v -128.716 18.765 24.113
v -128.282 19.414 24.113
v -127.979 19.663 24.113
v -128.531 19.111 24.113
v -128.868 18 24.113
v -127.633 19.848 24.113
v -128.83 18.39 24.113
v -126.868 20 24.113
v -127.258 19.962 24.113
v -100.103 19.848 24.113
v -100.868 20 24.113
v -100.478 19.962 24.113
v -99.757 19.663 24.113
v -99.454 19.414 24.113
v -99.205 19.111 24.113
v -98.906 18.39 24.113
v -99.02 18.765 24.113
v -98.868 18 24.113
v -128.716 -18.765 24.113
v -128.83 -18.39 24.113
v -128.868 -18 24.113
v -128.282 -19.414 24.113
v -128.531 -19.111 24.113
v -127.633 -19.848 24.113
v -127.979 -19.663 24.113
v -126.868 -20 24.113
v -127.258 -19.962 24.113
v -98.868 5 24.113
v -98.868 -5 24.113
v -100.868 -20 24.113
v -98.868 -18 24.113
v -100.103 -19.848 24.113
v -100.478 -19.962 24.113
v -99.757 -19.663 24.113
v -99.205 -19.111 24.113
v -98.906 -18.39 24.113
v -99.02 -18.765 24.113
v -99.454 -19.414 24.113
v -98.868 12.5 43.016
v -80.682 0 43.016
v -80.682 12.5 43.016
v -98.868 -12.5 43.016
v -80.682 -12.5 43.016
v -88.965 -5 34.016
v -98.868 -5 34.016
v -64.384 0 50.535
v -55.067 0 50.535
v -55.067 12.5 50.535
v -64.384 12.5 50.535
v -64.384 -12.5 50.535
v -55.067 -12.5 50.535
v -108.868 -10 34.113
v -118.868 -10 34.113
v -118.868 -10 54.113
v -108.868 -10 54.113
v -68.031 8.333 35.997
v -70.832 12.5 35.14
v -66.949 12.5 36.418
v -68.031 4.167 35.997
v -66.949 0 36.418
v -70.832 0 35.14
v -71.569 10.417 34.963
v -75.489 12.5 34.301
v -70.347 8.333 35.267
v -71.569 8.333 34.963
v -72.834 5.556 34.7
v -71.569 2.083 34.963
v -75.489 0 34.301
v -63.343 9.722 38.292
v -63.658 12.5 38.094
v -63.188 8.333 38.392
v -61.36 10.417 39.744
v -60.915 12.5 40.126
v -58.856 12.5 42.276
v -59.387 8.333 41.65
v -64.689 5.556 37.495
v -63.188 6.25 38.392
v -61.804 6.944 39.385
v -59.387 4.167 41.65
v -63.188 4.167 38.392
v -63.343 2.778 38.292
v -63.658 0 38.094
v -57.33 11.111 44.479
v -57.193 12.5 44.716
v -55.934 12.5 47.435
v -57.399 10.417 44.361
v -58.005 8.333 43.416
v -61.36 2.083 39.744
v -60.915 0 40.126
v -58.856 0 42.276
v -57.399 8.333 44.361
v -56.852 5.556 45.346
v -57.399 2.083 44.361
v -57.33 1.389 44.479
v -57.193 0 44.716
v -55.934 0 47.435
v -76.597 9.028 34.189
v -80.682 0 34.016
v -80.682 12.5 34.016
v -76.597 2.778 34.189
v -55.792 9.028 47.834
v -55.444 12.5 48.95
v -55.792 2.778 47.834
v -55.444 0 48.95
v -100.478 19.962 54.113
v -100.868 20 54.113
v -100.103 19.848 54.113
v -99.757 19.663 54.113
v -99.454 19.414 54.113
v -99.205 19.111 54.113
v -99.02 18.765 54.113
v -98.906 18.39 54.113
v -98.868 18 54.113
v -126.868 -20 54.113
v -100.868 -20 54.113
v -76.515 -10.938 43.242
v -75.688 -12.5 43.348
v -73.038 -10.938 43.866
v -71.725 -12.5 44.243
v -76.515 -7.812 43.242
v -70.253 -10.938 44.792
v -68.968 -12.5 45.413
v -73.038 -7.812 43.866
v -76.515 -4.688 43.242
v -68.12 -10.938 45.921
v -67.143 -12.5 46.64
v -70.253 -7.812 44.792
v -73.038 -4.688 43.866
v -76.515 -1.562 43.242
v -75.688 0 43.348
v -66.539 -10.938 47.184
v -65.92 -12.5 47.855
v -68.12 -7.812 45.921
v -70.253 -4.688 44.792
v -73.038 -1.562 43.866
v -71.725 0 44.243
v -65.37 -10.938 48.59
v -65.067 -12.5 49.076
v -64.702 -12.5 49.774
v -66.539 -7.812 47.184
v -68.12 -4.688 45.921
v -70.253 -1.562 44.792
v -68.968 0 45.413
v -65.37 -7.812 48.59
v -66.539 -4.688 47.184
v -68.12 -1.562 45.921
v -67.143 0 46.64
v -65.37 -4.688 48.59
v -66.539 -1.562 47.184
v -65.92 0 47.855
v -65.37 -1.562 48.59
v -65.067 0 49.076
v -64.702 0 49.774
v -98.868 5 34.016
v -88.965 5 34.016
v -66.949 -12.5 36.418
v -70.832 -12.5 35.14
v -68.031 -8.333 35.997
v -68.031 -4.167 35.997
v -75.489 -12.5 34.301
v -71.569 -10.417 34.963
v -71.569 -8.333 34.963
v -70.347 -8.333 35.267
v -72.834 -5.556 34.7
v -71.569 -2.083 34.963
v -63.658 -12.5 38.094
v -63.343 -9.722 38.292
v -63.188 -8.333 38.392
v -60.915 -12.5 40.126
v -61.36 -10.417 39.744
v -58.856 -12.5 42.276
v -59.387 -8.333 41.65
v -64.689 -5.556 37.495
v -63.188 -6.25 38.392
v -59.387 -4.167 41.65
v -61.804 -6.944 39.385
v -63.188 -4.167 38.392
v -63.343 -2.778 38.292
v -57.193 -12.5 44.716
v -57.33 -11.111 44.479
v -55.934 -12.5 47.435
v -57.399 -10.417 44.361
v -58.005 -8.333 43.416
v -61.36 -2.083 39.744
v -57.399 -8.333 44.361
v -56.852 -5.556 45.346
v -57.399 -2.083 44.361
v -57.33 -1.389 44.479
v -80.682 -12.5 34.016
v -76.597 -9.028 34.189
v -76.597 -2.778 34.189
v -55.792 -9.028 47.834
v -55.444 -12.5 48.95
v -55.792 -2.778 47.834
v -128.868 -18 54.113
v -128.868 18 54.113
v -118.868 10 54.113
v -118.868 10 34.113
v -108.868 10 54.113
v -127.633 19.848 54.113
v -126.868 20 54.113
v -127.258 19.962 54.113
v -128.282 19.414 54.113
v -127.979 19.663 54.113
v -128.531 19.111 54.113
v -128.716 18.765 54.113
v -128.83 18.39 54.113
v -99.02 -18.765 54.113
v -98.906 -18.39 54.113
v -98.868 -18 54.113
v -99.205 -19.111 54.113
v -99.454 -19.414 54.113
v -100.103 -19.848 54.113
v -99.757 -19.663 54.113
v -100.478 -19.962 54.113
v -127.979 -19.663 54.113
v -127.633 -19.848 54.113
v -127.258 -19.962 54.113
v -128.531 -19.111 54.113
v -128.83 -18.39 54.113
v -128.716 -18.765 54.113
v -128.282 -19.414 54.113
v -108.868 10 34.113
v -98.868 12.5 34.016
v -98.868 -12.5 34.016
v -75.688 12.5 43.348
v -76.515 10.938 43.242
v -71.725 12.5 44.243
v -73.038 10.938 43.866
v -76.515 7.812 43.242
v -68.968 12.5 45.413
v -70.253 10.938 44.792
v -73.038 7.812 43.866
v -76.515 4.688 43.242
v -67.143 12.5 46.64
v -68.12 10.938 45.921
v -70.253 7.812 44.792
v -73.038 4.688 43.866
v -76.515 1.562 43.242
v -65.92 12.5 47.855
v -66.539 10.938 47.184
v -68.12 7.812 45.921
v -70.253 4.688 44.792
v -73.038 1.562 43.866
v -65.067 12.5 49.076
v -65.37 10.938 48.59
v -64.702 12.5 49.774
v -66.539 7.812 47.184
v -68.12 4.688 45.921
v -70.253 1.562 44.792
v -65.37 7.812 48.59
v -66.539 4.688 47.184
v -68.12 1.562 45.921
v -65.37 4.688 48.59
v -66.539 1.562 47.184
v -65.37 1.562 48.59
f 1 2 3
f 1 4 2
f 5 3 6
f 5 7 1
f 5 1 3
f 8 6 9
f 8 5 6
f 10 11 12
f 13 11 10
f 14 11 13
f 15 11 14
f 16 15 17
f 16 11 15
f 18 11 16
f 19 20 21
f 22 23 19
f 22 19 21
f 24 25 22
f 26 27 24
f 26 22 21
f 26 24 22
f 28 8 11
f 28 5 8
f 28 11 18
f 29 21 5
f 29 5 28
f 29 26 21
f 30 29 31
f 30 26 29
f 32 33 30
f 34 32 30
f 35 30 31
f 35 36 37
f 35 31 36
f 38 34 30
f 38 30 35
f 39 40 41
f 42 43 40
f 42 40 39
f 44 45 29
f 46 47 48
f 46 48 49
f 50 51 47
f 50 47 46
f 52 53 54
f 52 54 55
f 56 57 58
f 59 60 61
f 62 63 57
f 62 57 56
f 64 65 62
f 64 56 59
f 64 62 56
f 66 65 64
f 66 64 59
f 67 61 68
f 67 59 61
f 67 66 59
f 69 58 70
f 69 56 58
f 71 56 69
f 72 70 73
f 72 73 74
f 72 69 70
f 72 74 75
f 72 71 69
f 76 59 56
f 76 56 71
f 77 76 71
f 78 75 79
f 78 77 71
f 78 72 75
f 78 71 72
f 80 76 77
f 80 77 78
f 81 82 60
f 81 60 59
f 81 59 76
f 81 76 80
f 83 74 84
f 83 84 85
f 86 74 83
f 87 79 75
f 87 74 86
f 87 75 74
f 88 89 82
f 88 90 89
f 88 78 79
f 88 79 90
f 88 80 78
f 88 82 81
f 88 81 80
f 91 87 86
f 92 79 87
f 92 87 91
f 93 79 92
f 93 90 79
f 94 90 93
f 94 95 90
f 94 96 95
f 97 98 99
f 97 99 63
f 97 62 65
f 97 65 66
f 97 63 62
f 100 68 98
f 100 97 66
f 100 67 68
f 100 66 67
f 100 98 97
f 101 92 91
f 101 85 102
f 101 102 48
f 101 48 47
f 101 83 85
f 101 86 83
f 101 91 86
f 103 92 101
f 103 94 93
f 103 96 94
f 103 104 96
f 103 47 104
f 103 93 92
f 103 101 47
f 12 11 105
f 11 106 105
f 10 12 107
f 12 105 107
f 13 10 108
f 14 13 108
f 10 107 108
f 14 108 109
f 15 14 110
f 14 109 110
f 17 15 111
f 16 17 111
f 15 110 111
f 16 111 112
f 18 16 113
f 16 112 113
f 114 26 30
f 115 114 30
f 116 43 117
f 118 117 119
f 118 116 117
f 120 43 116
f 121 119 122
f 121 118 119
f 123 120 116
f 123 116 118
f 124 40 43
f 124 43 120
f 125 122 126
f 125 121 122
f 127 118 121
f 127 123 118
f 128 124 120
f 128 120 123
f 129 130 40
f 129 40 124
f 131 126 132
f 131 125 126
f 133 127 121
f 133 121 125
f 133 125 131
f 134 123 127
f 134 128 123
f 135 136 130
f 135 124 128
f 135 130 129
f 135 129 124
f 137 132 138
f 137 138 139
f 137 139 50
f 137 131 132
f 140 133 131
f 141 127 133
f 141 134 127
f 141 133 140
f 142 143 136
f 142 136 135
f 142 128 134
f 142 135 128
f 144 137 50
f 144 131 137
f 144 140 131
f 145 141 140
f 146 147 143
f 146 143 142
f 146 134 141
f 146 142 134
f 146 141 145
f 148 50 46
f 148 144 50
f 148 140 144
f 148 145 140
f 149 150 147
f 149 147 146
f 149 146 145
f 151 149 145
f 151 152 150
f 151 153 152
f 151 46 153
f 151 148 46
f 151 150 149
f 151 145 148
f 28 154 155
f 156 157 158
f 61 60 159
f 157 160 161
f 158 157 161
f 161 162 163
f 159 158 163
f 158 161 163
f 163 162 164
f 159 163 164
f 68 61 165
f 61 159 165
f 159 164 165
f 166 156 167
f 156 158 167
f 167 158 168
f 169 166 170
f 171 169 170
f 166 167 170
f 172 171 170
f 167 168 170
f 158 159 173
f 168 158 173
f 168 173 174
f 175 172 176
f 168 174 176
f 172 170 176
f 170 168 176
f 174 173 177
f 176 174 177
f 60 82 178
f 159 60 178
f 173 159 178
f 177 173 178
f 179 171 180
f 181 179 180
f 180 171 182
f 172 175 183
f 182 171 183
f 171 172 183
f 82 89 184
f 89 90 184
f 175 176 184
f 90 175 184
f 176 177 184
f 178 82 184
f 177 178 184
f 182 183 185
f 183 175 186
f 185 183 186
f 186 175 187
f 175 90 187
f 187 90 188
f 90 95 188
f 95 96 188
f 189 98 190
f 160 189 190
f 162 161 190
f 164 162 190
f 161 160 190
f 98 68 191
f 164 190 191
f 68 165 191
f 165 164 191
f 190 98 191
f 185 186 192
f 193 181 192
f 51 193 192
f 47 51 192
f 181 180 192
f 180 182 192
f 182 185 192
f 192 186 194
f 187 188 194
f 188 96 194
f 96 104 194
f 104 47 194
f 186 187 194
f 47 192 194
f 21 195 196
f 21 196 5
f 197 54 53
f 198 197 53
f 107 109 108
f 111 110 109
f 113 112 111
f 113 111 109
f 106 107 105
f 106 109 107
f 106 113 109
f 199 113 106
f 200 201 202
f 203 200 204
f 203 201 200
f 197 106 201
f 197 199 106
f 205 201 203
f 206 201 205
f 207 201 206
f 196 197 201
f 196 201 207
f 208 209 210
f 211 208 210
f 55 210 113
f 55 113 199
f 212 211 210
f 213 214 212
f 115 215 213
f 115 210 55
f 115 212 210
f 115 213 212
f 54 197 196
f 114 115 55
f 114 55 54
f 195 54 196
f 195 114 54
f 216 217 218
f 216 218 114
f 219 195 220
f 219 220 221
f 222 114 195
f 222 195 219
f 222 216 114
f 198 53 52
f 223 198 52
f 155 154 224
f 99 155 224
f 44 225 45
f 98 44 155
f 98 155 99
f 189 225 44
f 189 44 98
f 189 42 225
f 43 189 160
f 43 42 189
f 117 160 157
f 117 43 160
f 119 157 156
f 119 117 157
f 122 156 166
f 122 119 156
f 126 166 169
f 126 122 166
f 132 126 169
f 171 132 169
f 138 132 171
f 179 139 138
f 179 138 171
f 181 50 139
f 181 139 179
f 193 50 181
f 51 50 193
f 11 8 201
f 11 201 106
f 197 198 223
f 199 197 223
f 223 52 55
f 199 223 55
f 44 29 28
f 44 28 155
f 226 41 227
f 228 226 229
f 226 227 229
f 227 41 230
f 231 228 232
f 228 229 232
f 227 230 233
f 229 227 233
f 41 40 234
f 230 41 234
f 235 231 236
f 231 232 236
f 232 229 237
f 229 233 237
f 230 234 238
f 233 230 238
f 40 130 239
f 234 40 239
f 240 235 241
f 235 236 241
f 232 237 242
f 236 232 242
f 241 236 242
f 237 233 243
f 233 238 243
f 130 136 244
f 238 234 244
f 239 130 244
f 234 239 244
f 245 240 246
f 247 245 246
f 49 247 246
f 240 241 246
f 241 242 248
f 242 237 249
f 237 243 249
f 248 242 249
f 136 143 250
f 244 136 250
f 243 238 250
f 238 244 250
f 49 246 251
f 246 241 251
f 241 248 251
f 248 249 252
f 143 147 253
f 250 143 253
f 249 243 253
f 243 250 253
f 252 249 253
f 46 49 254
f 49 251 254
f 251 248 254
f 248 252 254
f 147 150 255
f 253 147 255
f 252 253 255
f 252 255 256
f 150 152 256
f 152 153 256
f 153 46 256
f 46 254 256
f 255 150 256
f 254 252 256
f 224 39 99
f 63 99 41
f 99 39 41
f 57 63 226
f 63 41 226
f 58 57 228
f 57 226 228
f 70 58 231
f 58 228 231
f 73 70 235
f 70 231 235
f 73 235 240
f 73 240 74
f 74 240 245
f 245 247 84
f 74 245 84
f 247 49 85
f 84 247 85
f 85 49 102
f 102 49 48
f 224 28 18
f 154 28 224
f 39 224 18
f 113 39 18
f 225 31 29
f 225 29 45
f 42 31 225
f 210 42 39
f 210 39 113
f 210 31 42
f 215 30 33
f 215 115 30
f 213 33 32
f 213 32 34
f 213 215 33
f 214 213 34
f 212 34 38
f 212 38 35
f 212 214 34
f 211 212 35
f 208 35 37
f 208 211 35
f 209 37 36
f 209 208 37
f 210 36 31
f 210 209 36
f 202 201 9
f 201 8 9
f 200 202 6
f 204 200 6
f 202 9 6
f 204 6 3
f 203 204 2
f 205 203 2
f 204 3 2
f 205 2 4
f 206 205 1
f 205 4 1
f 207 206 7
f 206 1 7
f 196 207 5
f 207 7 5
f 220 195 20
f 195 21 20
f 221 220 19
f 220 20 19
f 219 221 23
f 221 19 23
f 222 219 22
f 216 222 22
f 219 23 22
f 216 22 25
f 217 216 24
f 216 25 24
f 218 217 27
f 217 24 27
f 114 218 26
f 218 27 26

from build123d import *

# Parameters (mm, degrees)
F1_DEPTH     = 20
F2_DEPTH     = 12.5
F3_DEPTH     = 5
F4_R         = 2
F5_T         = 10
F5_T3_DEPTH  = 29.9026188965
F5_T5_DEPTH  = 27.5
F5_T7_DEPTH  = 27.5
F5_T9_DEPTH  = 29
F5_T11_DEPTH = 45
F5_T13_DEPTH = 29.9026188965
F5_T15_DEPTH = 30


# Not quite as in the source:
# - ends of sketch curves that miss each other by under 0.0002 mm in the source are joined
# - a shell that OpenCascade refuses in one call is made with other operations: the cavity is built on its own and cut out


with BuildPart() as f1:
    # F0 (on Front) → F1 (new body, symmetric)
    with BuildSketch(Plane.XZ):
        Polygon((-98.8679975982, 54.1129348578), (-128.8679975982, 54.1129348578), (-128.8679975982, 24.1129348578), (-98.8679975982, 24.1129348578), (-98.8679975982, 34.0155537543), (-98.8679975982, 43.0155537543), align=None)
    extrude(amount=F1_DEPTH, both=True)

    # F0 (on Front) → F2 (join, symmetric)
    with BuildSketch(Plane.XZ):
        with BuildLine():
            Line((-80.6820849815, 43.0155537543), (-98.8679975982, 43.0155537543))
            Line((-98.8679975982, 43.0155537543), (-98.8679975982, 34.0155537543))
            Line((-98.8679975982, 34.0155537543), (-88.9653787017, 34.0155537543))
            Line((-88.9653787017, 34.0155537543), (-80.682094855, 34.0155537543))
            add(Edge.make_bspline(
                [(-80.682094855, 34.0155537543), (-66.1309954288, 34.0155509655), (-57.1216260093, 40.1806794107), (-55.0665845173, 50.5349263549)],
                knots=[0, 0, 0, 0, 30.4802237684, 30.4802237684, 30.4802237684, 30.4802237684], degree=3))
            Line((-55.0665845173, 50.5349263549), (-64.3839240074, 50.5349263549))
            add(Edge.make_bspline(
                [(-80.6820849815, 43.0155537543), (-79.1809668737, 43.0155537553), (-76.3999490421, 43.1750788515), (-72.9213473732, 43.8149397212), (-70.1430488739, 44.758463036), (-68.0271542887, 45.9005167962), (-66.4709613794, 47.1632066722), (-65.3230275472, 48.5510213805), (-64.6991129712, 49.71943479), (-64.4207731634, 50.4356187157), (-64.3839240074, 50.5349263549)],
                knots=[2.262e-07, 2.262e-07, 2.262e-07, 2.262e-07, 0.125, 0.25, 0.375, 0.5, 0.625, 0.75, 0.875, 0.8947169283, 0.8947169283, 0.8947169283, 0.8947169283], degree=3))
        make_face()
    extrude(amount=F2_DEPTH, both=True)

    # F0 (on Front) → F3 (join, symmetric)
    with BuildSketch(Plane.XZ):
        Polygon((-98.8679975982, 34.0155537543), (-98.8679975982, 24.1129348578), (-88.9653787017, 34.0155537543), align=None)
    extrude(amount=F3_DEPTH, both=True)

    # F4
    f4_edges = [f1.edges().sort_by_distance(p)[0] for p in [
        (-98.867998, -20, 39.112935),
        (-128.867998, -20, 39.112935),
        (-98.867998, 20, 39.112935),
        (-128.867998, 20, 39.112935),
    ]]
    fillet(f4_edges, radius=F4_R)

    # F5: shell of thickness 10, made by hand


with BuildPart() as f5_core1:
    # F5_t2: copy of F1
    add(f1.part)

    # the walls: a layer under each face that stays
    f5_faces = [f5_core1.faces().sort_by_distance(p)[0] for p in [
        (-113.8679975982, 20, 39.1129348578),
        (-98.8679975982, 12, 29.1129348578),
        (-128.8679975982, 0, 39.1129348578),
        (-113.8679975982, -20, 39.1129348578),
        (-113.8679975982, 0, 24.1129348578),
        (-97.2175611154, -5, 29.0642443061),
        (-97.2175611154, 5, 29.0642443061),
        (-95.8370138076, 8.3333333333, 34.0155537543),
        (-76.9672910577, -12.5, 42.2752386602),
        (-76.9672910577, 12.5, 42.2752386602),
        (-89.7750412898, 0, 43.0155537543),
        (-93.9166881499, 0, 29.0642443061),
        (-63.1883179608, -6.25, 38.3923964047),
        (-63.1883179608, 6.25, 38.3923964047),
        (-59.7252542624, 0, 50.5349263549),
        (-68.9445639905, -6.25, 45.4259334498),
        (-68.9445639905, 6.25, 45.4259334498),
    ]]
    thicken(f5_faces, amount=-F5_T, mode=Mode.SUBTRACT)

    # F5_s4 → F5_t3 (cut)
    with BuildSketch(Plane.XY.offset(14.1129348578)):
        Polygon((-98.7679975982, -5.1), (-108.8679975982, -5), (-108.8679975982, 5), (-98.8679975982, 5), align=None)
        Polygon((-98.7679975982, 5.1), (-108.8679975982, 5), (-108.8679975982, -5), (-98.8679975982, -5), align=None)
    extrude(amount=F5_T3_DEPTH, mode=Mode.SUBTRACT)

    # F5_s6 → F5_t5 (cut)
    with BuildSketch(Plane.XZ.offset(-5)):
        Polygon((-98.7679975982, 33.9155537543), (-108.8679975982, 34.0155537543), (-108.8679975982, 44.0155537543), (-98.8679975982, 44.0155537543), align=None)
    extrude(amount=F5_T5_DEPTH, mode=Mode.SUBTRACT)

    # F5_s8 → F5_t7 (cut)
    with BuildSketch(Plane.XZ.offset(-22.5)):
        Polygon((-98.7679975982, 33.9155537543), (-108.8679975982, 34.0155537543), (-108.8679975982, 44.0155537543), (-98.8679975982, 44.0155537543), align=None)
    extrude(amount=F5_T7_DEPTH, mode=Mode.SUBTRACT)

    # F5_s10 → F5_t9 (cut)
    with BuildSketch(Plane.XY.offset(24.0155537543)):
        Polygon((-98.7679975982, -12.6), (-108.8679975982, -12.5), (-108.8679975982, -2.5), (-98.8679975982, -2.5), align=None)
        Polygon((-98.7679975982, 12.6), (-108.8679975982, 12.5), (-108.8679975982, 2.5), (-98.8679975982, 2.5), align=None)
    extrude(amount=F5_T9_DEPTH, mode=Mode.SUBTRACT)

    # F5_s12 → F5_t11 (cut)
    with BuildSketch(Plane.XZ.offset(-22.5)):
        Polygon((-98.7679975982, 43.1155537543), (-108.8679975982, 43.0155537543), (-108.8679975982, 33.0155537543), (-98.8679975982, 33.0155537543), align=None)
    extrude(amount=F5_T11_DEPTH, mode=Mode.SUBTRACT)

    # F5_s14 → F5_t13 (cut)
    with BuildSketch(Plane.YZ.offset(-108.8679975982)):
        Polygon((-5.1, 33.9155537543), (5, 34.0155537543), (5, 44.0155537543), (-5, 44.0155537543), align=None)
        Polygon((5.1, 33.9155537543), (-5, 34.0155537543), (-5, 44.0155537543), (5, 44.0155537543), align=None)
    extrude(amount=F5_T13_DEPTH, mode=Mode.SUBTRACT)

    # F5_s16 → F5_t15 (cut)
    with BuildSketch(Plane.XZ.offset(-15)):
        Polygon((-88.8946680236, 33.8448430762), (-88.9653787017, 44.0155537543), (-93.1075143254, 44.0155537543), (-96.0364465136, 41.0866215662), align=None)
    extrude(amount=F5_T15_DEPTH, mode=Mode.SUBTRACT)


with BuildPart() as f1_1:
    add(f1.part)

    # what is left inside the walls is the cavity
    f5_cavity = [f5_core1.part.solids().sort_by_distance(p)[0] for p in [
        (-118.767998, 3.333333, 44.112935),
    ]]
    add(f5_cavity, mode=Mode.SUBTRACT)


solid = f1_1.part
